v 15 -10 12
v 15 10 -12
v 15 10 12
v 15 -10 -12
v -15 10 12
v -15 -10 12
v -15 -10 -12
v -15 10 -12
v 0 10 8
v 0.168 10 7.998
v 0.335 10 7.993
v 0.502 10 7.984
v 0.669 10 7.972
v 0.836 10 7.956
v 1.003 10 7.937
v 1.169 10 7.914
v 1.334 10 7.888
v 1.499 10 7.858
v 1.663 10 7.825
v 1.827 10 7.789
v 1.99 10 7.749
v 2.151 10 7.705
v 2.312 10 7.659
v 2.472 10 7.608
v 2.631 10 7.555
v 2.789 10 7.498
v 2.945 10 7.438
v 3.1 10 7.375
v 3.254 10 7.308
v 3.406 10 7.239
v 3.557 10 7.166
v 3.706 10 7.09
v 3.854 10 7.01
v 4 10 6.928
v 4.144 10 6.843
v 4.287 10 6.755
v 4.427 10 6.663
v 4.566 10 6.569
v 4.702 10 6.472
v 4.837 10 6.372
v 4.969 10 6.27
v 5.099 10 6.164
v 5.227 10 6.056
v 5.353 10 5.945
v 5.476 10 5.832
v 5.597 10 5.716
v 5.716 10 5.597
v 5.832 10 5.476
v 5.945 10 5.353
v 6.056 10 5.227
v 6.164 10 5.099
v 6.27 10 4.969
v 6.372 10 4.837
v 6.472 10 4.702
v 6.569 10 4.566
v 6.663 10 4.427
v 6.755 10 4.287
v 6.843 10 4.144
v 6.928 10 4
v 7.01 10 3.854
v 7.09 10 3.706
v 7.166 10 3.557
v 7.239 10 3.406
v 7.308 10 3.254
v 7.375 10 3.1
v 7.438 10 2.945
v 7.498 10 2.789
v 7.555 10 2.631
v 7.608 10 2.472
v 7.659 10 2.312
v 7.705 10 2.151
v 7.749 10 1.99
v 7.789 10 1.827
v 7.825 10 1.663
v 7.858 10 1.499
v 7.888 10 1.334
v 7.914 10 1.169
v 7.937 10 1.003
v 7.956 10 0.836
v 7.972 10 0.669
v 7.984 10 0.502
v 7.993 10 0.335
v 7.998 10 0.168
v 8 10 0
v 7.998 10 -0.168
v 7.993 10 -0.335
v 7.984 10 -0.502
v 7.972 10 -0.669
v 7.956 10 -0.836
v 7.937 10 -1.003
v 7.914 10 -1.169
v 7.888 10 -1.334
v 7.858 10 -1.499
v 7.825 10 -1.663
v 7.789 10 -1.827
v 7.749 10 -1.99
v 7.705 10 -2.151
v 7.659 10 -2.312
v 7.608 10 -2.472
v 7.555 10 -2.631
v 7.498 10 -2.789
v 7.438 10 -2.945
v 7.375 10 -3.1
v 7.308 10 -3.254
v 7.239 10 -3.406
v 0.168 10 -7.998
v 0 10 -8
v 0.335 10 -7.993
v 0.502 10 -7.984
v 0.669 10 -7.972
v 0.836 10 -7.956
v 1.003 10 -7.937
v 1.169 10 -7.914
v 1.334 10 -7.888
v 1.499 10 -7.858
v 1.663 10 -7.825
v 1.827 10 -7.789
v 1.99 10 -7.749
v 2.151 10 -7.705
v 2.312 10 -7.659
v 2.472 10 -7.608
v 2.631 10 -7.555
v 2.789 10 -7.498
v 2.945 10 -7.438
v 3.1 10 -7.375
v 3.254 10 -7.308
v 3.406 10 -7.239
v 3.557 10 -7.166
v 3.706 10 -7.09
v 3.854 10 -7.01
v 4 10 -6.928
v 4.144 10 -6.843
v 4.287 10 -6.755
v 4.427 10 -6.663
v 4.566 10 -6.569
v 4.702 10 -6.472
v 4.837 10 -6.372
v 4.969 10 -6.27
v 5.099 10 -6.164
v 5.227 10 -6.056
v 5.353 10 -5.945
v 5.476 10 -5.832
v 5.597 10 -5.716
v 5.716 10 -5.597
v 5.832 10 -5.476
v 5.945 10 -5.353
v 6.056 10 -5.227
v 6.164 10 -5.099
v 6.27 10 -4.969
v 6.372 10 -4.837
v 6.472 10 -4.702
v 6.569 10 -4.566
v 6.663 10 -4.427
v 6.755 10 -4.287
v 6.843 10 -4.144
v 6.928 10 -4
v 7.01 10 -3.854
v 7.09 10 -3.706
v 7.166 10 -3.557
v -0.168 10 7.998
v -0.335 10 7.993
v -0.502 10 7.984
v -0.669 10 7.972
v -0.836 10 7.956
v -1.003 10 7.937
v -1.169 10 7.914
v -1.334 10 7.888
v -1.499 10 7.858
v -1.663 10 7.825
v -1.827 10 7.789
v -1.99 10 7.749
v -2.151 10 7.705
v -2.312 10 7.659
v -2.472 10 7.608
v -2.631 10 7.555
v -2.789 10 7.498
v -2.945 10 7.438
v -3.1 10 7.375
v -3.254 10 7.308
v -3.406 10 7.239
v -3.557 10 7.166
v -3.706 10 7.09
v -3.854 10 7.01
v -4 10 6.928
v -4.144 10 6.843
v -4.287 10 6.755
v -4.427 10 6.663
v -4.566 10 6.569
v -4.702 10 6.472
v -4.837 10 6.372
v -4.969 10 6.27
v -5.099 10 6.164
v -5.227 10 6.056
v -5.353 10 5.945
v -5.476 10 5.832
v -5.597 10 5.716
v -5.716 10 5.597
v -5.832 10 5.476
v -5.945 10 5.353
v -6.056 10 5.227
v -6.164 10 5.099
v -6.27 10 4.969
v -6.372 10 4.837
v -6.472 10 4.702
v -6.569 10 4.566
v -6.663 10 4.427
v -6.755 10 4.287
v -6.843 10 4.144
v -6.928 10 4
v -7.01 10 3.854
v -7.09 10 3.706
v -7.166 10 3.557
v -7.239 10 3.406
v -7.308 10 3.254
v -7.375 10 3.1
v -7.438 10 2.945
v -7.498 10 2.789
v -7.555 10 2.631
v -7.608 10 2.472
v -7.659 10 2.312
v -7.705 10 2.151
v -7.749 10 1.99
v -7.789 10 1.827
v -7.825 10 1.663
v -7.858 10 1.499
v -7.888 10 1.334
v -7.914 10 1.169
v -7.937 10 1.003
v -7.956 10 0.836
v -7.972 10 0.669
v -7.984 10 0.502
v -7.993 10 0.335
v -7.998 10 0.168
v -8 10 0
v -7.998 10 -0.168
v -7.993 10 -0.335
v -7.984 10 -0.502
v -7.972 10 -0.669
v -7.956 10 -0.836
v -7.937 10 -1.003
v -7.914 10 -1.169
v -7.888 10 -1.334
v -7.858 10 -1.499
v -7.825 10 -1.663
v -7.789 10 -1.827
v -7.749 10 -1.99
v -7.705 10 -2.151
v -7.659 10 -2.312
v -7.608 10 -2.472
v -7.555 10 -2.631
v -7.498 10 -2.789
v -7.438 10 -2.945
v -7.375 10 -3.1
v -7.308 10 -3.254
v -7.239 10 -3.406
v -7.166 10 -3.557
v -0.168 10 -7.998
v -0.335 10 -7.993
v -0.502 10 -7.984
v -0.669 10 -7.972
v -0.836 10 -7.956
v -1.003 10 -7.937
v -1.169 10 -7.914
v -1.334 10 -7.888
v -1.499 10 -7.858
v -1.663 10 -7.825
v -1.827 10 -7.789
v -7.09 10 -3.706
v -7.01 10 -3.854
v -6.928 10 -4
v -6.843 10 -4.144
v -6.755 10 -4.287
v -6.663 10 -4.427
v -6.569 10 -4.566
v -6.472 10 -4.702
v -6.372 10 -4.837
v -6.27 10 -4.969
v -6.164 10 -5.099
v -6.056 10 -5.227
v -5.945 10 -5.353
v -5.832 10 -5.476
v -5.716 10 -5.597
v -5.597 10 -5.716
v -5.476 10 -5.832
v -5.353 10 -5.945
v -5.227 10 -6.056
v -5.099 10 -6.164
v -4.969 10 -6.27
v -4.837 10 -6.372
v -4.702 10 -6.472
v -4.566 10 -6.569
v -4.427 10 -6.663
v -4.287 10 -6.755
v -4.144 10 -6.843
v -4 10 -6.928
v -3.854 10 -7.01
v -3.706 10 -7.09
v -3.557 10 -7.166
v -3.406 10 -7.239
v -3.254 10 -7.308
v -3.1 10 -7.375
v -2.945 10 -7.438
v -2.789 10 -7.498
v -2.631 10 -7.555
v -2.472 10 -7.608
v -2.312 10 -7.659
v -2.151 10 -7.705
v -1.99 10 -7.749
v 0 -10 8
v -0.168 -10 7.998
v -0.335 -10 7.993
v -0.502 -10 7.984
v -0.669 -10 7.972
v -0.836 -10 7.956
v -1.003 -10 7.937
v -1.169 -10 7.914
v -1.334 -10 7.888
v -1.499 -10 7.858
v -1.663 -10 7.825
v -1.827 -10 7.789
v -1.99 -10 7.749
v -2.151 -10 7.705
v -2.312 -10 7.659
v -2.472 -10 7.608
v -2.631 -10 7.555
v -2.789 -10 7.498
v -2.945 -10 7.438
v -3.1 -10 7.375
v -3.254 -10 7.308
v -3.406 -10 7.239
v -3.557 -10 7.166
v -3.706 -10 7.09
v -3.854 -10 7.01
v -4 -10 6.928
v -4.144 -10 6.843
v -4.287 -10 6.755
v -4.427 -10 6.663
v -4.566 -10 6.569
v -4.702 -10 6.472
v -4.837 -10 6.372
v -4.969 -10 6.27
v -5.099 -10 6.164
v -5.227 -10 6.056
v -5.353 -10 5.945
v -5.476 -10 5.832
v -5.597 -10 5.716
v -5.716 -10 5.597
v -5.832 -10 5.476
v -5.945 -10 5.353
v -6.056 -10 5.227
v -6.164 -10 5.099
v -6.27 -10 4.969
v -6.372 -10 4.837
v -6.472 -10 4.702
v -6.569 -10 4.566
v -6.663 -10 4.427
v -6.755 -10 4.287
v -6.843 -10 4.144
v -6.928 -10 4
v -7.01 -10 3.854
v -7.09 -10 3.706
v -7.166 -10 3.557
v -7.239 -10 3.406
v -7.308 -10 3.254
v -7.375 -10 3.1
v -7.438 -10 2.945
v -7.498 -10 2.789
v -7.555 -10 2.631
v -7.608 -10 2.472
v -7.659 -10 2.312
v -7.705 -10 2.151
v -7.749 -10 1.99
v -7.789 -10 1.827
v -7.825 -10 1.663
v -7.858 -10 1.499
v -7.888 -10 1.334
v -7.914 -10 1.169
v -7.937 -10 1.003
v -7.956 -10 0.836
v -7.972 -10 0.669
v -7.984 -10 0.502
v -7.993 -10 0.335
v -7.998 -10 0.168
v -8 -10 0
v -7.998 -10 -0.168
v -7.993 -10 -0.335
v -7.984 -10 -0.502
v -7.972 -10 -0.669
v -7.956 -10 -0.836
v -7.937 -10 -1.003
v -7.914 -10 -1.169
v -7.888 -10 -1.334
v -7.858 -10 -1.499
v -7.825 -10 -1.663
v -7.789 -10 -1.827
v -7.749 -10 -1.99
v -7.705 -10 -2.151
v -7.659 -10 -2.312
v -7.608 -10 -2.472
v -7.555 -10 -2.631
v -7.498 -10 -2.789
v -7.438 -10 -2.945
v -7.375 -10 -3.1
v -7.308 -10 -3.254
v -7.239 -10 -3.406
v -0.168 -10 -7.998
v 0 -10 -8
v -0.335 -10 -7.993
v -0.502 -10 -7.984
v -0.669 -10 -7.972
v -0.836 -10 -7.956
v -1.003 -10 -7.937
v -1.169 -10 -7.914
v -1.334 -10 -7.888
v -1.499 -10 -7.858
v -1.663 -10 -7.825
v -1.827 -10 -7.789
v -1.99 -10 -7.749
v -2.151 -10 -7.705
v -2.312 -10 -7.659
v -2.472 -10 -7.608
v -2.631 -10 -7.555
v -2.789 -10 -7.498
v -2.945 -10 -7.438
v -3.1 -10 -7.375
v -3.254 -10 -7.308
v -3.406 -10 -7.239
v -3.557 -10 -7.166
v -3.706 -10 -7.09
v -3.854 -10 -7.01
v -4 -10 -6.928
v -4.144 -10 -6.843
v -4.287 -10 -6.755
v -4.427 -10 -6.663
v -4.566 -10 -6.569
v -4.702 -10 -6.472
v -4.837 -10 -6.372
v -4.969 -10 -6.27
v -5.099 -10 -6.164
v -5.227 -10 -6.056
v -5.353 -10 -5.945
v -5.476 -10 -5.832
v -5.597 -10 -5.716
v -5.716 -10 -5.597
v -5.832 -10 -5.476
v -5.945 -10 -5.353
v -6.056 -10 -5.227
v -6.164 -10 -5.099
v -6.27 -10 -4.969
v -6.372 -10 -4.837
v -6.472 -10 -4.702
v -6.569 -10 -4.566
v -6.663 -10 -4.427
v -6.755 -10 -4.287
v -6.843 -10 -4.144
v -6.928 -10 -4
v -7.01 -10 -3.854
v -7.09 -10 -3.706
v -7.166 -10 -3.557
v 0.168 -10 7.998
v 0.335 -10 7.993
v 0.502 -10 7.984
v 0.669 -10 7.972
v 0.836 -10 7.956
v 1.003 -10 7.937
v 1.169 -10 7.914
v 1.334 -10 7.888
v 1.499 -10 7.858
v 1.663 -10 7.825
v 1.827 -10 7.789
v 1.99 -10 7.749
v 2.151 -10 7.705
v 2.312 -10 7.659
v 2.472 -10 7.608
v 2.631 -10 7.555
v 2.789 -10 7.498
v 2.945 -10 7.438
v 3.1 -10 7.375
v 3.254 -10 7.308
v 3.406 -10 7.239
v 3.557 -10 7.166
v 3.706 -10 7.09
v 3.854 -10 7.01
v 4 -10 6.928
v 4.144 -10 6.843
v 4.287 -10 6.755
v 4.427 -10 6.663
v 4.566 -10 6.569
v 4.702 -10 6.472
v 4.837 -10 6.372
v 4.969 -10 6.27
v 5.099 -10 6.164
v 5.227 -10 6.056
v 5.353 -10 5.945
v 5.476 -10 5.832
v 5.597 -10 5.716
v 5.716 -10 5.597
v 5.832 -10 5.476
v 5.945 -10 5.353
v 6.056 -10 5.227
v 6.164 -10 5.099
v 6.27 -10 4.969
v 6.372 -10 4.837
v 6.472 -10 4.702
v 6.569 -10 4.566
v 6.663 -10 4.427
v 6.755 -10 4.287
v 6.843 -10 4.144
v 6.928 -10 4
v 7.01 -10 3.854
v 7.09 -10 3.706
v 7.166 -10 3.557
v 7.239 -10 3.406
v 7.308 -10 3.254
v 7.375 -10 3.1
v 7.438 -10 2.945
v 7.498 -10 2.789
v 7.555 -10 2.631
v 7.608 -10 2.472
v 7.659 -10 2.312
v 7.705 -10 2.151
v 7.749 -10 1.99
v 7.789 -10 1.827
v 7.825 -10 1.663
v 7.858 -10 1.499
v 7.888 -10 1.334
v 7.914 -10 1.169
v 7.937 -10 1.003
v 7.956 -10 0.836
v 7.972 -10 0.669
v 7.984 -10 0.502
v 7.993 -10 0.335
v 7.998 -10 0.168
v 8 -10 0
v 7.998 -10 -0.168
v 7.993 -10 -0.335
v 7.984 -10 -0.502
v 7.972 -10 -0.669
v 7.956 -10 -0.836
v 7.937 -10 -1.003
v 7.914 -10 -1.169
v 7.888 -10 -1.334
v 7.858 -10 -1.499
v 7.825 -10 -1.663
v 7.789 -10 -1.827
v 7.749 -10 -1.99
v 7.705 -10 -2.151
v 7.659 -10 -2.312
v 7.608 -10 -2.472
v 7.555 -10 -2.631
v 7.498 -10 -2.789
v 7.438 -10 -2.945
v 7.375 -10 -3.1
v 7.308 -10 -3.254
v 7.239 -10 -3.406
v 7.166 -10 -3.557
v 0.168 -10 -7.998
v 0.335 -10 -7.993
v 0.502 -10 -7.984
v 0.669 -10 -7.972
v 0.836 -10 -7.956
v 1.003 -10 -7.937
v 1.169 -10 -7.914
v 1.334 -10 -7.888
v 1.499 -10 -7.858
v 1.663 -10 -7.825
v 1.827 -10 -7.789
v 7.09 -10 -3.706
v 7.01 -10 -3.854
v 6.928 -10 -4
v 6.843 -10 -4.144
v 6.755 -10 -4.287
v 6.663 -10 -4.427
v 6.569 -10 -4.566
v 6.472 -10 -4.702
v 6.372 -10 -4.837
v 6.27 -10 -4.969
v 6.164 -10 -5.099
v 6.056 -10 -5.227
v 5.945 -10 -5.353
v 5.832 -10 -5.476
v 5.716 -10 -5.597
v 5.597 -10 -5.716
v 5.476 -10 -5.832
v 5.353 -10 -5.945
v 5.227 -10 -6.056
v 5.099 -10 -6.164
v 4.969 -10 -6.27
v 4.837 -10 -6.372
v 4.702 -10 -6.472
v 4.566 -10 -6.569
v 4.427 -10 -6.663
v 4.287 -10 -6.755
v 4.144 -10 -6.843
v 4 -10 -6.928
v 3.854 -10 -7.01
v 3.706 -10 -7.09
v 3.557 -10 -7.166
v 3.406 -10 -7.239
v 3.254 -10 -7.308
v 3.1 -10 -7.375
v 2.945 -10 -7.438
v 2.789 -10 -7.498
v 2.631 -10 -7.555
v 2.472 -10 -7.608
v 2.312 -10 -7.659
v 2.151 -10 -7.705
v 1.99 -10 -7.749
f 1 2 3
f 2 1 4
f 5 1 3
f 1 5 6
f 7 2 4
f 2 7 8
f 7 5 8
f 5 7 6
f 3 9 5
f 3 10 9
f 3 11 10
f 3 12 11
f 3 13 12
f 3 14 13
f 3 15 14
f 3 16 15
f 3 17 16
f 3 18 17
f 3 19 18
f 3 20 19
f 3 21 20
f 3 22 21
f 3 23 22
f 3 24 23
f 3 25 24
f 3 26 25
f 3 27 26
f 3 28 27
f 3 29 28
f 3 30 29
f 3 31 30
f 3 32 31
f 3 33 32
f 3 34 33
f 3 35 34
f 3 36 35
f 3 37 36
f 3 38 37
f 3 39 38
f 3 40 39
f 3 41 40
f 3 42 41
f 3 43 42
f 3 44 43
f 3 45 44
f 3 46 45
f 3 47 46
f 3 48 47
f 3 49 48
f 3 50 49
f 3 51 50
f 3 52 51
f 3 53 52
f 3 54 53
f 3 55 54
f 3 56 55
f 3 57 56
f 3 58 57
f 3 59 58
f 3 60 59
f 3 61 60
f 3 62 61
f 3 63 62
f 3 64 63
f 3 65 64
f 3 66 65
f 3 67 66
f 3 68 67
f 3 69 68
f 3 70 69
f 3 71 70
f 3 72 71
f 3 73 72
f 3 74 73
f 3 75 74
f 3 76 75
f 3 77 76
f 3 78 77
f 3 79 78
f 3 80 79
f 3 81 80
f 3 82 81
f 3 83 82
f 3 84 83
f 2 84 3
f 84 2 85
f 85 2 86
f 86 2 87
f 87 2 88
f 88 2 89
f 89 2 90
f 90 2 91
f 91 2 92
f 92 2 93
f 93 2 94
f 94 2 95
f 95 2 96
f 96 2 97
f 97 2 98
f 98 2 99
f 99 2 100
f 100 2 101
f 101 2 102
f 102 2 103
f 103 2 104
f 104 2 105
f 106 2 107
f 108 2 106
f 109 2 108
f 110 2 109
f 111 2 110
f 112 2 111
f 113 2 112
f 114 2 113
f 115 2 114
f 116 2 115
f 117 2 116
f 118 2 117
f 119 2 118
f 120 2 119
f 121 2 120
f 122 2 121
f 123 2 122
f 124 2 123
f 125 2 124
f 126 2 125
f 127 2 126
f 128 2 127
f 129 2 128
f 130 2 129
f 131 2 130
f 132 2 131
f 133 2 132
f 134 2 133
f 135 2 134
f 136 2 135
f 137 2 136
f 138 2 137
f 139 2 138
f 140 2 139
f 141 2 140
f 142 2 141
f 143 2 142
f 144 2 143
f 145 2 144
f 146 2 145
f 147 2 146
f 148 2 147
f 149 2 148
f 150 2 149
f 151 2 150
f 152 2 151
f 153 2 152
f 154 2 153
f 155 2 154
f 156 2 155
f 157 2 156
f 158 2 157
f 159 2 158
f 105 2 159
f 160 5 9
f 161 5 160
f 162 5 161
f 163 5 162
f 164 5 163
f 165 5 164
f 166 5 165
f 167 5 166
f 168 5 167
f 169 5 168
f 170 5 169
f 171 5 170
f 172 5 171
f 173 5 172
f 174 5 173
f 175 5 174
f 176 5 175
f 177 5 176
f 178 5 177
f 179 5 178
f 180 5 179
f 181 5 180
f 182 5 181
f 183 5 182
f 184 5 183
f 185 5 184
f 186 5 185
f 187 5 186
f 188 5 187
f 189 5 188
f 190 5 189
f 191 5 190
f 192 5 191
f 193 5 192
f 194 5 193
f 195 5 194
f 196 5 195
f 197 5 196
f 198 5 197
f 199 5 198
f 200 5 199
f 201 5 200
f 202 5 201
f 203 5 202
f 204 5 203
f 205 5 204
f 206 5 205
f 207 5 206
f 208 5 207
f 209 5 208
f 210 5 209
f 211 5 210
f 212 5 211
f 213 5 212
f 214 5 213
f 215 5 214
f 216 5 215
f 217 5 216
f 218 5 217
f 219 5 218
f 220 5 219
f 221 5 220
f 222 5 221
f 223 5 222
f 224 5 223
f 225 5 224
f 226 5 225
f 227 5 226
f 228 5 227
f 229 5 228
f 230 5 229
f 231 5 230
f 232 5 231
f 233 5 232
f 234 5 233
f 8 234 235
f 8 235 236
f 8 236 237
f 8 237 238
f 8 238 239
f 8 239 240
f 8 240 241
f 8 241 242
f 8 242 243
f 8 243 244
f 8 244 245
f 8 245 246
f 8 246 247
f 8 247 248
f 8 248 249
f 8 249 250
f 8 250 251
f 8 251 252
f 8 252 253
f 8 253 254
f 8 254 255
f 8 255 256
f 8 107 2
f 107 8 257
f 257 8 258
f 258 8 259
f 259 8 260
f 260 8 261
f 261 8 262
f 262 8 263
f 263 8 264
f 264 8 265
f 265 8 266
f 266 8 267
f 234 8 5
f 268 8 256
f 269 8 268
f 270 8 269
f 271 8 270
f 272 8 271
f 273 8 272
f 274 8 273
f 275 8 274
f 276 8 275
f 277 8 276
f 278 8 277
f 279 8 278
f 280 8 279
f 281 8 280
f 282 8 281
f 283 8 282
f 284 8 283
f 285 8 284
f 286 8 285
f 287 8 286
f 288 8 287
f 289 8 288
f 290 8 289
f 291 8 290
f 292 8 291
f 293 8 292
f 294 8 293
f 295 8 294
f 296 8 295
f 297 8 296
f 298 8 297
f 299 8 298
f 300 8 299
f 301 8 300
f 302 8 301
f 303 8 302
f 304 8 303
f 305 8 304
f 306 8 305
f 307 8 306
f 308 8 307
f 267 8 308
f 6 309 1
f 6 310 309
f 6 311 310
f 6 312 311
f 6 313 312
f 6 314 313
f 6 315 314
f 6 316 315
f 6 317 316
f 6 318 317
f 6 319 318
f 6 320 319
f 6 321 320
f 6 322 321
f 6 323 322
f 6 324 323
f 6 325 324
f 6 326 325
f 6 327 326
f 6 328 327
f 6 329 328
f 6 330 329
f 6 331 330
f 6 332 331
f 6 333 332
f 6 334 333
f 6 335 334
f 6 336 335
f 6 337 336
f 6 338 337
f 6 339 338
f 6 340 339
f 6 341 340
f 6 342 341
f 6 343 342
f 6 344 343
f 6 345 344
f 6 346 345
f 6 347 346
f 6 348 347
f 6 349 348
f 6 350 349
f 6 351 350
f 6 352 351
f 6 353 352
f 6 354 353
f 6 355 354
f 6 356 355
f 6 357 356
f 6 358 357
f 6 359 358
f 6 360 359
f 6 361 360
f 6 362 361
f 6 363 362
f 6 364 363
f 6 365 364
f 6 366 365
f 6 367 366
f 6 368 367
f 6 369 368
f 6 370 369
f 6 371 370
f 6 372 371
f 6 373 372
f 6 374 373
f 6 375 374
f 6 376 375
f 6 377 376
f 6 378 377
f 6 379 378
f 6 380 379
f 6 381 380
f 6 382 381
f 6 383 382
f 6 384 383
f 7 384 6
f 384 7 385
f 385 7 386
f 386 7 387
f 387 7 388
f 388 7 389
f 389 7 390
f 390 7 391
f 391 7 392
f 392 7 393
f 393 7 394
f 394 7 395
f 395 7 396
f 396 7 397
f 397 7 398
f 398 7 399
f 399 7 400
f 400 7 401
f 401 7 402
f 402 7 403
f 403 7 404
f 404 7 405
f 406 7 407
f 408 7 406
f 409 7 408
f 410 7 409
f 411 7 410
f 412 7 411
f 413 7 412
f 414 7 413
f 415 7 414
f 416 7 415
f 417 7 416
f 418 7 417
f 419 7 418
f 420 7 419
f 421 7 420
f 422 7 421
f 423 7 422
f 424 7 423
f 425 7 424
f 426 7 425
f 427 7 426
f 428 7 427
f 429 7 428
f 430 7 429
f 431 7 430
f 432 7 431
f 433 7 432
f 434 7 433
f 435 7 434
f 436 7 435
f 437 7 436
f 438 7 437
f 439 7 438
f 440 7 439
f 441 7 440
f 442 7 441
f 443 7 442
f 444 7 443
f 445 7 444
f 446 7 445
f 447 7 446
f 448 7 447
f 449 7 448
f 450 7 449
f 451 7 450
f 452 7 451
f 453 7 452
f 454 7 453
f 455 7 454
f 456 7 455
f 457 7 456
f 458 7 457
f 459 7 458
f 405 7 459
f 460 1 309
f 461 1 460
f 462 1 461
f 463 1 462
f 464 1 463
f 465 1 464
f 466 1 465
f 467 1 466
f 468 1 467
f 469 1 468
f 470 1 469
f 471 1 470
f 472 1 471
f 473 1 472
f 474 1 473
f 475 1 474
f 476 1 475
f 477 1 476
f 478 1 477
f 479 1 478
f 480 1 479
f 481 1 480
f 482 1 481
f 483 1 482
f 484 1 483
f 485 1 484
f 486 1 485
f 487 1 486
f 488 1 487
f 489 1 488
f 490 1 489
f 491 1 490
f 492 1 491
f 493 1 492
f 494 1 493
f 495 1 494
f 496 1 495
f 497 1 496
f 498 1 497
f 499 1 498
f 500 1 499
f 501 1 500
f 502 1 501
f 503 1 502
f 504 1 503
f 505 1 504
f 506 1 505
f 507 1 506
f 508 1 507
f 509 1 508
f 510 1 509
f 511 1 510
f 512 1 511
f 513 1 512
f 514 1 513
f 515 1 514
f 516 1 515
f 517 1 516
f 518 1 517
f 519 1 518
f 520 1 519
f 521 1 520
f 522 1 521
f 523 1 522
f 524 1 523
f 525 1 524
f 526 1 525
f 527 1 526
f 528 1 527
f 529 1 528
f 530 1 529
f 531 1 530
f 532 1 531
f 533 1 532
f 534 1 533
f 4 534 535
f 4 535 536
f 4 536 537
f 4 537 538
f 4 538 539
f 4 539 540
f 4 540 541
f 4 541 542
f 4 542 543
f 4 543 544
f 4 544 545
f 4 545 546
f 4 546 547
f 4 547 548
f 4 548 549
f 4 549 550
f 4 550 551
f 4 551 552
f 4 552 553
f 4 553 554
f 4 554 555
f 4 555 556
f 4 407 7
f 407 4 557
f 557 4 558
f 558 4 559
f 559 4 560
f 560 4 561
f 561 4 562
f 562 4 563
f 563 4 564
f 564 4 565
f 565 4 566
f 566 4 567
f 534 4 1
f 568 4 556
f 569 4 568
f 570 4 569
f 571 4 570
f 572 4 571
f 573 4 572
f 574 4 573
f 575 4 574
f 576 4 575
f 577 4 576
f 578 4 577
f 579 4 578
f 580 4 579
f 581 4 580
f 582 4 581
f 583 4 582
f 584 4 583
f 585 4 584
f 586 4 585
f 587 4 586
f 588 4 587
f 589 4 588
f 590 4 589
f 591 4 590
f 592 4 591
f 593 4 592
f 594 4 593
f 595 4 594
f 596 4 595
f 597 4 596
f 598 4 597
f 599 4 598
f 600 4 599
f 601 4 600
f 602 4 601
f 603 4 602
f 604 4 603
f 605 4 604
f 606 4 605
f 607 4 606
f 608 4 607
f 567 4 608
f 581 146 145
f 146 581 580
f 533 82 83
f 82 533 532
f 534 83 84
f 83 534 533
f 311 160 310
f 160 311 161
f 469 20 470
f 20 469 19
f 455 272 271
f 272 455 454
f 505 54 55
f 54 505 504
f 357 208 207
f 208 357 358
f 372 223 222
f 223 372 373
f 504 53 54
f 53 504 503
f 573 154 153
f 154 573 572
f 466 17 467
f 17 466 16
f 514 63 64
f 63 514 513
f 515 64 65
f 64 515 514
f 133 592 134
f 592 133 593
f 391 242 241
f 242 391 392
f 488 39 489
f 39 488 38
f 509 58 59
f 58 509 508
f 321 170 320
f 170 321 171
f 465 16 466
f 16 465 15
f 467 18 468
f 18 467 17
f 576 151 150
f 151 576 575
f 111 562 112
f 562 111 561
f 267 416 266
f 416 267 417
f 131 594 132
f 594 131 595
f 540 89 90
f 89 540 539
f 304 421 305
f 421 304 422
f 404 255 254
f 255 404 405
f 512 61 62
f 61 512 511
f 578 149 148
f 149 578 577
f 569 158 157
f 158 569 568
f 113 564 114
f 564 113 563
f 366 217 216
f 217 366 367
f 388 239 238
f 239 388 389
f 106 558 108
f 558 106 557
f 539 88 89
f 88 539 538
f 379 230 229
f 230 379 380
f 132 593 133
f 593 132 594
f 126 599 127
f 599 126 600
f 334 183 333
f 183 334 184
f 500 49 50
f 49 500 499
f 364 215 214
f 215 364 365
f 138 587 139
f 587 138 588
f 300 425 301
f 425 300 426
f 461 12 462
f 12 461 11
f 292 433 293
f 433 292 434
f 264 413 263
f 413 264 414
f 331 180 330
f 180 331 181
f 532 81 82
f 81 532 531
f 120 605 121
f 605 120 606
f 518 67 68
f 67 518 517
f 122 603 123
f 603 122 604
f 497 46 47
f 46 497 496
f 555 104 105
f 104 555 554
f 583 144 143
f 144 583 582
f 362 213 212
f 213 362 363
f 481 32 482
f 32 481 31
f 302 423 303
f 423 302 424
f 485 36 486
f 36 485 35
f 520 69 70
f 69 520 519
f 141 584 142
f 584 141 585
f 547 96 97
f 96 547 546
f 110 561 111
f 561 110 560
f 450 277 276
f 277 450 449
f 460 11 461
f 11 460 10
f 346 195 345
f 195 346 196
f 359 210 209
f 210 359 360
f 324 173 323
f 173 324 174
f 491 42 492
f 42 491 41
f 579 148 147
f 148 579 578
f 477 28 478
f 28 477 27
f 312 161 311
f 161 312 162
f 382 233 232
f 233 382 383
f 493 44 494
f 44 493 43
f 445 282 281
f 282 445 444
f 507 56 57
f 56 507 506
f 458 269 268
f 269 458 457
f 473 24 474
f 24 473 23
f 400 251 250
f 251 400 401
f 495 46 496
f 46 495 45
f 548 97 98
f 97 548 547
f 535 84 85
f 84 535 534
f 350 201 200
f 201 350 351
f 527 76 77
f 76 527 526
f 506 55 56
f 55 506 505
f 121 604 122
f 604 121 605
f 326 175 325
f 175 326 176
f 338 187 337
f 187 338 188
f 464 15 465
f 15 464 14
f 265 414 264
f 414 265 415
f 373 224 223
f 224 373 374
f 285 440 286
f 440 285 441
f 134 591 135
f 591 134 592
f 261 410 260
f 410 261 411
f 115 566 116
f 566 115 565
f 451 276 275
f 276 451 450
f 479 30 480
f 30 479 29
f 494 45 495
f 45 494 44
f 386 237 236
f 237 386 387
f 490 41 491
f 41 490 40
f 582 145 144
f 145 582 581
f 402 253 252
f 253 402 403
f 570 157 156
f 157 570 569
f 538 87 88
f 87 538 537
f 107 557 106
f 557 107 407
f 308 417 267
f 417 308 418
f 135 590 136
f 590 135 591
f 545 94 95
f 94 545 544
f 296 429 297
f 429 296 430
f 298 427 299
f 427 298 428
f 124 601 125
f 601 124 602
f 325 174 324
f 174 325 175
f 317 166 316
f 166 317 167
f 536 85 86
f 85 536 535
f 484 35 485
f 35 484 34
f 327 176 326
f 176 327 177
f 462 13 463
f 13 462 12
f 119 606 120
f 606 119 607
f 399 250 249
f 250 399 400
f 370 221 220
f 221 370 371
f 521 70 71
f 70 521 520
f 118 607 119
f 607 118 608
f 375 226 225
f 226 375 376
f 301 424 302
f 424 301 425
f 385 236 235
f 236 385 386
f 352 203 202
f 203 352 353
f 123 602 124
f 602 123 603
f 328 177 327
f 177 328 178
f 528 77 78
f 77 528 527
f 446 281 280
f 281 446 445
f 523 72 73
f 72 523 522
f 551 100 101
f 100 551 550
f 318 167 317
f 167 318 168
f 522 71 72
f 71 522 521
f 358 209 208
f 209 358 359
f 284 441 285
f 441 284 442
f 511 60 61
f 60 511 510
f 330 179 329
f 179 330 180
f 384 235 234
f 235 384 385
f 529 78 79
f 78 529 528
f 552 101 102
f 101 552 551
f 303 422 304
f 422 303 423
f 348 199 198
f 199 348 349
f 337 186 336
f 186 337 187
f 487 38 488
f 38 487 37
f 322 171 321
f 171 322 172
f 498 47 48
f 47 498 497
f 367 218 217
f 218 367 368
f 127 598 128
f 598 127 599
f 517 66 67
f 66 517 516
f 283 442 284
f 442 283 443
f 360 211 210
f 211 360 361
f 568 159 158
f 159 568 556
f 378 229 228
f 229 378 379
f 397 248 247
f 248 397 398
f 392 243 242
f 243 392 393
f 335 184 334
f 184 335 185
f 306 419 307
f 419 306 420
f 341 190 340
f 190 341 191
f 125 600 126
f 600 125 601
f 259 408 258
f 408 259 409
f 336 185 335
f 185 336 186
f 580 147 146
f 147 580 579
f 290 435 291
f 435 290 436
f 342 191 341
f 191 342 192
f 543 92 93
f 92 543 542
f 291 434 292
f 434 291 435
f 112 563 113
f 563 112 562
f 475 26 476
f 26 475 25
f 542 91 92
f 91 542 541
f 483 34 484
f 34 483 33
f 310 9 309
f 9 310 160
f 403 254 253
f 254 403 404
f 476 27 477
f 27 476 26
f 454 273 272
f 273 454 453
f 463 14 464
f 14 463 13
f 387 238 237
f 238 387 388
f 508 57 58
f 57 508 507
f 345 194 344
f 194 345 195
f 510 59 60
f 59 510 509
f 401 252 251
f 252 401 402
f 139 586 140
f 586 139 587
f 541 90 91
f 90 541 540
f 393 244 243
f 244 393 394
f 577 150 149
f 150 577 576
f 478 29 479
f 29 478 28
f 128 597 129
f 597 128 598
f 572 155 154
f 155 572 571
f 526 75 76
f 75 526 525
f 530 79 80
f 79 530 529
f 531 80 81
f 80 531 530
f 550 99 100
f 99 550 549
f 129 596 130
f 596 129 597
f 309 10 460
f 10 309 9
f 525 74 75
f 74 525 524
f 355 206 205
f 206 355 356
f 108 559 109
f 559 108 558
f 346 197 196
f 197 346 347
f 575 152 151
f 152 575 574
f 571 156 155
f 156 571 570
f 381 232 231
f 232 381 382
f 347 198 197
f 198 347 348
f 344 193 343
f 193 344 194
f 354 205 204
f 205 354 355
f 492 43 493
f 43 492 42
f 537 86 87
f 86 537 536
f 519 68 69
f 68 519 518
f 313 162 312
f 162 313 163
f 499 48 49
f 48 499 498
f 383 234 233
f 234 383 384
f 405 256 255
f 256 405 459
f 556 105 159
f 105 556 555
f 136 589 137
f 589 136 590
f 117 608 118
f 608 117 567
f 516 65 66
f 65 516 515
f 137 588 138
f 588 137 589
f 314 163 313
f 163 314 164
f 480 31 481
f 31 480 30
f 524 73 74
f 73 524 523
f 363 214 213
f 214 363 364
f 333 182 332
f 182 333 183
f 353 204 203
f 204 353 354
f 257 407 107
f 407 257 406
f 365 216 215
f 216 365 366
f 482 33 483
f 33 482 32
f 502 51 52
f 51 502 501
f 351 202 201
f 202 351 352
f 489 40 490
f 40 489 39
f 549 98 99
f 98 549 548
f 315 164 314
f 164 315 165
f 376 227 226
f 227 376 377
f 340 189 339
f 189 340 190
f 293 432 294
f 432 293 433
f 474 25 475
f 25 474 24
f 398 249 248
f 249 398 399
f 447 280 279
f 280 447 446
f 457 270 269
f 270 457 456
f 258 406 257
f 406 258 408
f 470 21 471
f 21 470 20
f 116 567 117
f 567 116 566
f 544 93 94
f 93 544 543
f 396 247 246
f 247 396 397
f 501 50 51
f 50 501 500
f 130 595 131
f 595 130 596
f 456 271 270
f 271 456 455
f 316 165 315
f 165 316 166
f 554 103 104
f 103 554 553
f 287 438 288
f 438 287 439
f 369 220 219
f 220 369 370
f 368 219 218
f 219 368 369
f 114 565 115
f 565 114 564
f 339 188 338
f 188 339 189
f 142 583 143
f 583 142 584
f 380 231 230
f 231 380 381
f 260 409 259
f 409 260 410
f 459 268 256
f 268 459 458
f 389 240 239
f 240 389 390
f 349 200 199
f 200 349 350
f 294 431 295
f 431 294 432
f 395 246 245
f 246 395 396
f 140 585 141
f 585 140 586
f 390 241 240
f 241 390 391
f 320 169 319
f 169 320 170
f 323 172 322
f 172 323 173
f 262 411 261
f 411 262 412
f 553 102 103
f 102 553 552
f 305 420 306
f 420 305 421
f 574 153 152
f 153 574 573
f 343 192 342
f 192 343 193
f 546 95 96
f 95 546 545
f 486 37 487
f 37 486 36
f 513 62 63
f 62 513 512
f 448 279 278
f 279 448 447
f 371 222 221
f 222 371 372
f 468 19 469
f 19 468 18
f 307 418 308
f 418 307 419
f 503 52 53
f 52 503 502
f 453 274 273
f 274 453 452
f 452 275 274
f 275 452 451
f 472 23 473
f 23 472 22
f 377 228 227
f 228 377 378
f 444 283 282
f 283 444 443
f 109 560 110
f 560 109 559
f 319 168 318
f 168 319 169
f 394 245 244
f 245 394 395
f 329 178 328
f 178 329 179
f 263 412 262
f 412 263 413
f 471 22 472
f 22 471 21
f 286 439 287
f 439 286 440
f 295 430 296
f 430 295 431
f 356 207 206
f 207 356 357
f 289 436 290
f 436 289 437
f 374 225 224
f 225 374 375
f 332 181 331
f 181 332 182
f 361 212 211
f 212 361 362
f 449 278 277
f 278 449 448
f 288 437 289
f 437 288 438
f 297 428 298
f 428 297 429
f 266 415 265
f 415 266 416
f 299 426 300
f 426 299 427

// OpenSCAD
// file: dimensions.scad
capsule_length = 37.5;
capsule_dia = 12.5; // 13 - 0.5

capsule_flat_y=1.5;
reed_length=14;
// actually reed_dia = 2;
reed_dia = 3.2;


outer_stud_width = 2;
middle_stud_width = 2;

connector_x=6;
connector_y=2;
connector_gap_mill_z = 4;
mating_tolerance = 0.1;


tube_inner_dia = 13;
tube_outer_dia = 16;

magnet2_innerdia = 20;
magnet2_outerdia = 25;
magnet2_length = 10;
// main file
$fn = 300;
include <dimensions.scad>;

tube_envelope=2;
stand_dia = 30;
stand_axis=20;
stand_thickness = tube_outer_dia+tube_envelope*4;
module standedge()
{
    difference()
    {
        cube([stand_dia,stand_axis, stand_thickness], center=true);

        translate([0,stand_axis/2, 0])
        rotate([90,0,0])
        cylinder(d=tube_outer_dia, 40);
    }
}

standedge();
